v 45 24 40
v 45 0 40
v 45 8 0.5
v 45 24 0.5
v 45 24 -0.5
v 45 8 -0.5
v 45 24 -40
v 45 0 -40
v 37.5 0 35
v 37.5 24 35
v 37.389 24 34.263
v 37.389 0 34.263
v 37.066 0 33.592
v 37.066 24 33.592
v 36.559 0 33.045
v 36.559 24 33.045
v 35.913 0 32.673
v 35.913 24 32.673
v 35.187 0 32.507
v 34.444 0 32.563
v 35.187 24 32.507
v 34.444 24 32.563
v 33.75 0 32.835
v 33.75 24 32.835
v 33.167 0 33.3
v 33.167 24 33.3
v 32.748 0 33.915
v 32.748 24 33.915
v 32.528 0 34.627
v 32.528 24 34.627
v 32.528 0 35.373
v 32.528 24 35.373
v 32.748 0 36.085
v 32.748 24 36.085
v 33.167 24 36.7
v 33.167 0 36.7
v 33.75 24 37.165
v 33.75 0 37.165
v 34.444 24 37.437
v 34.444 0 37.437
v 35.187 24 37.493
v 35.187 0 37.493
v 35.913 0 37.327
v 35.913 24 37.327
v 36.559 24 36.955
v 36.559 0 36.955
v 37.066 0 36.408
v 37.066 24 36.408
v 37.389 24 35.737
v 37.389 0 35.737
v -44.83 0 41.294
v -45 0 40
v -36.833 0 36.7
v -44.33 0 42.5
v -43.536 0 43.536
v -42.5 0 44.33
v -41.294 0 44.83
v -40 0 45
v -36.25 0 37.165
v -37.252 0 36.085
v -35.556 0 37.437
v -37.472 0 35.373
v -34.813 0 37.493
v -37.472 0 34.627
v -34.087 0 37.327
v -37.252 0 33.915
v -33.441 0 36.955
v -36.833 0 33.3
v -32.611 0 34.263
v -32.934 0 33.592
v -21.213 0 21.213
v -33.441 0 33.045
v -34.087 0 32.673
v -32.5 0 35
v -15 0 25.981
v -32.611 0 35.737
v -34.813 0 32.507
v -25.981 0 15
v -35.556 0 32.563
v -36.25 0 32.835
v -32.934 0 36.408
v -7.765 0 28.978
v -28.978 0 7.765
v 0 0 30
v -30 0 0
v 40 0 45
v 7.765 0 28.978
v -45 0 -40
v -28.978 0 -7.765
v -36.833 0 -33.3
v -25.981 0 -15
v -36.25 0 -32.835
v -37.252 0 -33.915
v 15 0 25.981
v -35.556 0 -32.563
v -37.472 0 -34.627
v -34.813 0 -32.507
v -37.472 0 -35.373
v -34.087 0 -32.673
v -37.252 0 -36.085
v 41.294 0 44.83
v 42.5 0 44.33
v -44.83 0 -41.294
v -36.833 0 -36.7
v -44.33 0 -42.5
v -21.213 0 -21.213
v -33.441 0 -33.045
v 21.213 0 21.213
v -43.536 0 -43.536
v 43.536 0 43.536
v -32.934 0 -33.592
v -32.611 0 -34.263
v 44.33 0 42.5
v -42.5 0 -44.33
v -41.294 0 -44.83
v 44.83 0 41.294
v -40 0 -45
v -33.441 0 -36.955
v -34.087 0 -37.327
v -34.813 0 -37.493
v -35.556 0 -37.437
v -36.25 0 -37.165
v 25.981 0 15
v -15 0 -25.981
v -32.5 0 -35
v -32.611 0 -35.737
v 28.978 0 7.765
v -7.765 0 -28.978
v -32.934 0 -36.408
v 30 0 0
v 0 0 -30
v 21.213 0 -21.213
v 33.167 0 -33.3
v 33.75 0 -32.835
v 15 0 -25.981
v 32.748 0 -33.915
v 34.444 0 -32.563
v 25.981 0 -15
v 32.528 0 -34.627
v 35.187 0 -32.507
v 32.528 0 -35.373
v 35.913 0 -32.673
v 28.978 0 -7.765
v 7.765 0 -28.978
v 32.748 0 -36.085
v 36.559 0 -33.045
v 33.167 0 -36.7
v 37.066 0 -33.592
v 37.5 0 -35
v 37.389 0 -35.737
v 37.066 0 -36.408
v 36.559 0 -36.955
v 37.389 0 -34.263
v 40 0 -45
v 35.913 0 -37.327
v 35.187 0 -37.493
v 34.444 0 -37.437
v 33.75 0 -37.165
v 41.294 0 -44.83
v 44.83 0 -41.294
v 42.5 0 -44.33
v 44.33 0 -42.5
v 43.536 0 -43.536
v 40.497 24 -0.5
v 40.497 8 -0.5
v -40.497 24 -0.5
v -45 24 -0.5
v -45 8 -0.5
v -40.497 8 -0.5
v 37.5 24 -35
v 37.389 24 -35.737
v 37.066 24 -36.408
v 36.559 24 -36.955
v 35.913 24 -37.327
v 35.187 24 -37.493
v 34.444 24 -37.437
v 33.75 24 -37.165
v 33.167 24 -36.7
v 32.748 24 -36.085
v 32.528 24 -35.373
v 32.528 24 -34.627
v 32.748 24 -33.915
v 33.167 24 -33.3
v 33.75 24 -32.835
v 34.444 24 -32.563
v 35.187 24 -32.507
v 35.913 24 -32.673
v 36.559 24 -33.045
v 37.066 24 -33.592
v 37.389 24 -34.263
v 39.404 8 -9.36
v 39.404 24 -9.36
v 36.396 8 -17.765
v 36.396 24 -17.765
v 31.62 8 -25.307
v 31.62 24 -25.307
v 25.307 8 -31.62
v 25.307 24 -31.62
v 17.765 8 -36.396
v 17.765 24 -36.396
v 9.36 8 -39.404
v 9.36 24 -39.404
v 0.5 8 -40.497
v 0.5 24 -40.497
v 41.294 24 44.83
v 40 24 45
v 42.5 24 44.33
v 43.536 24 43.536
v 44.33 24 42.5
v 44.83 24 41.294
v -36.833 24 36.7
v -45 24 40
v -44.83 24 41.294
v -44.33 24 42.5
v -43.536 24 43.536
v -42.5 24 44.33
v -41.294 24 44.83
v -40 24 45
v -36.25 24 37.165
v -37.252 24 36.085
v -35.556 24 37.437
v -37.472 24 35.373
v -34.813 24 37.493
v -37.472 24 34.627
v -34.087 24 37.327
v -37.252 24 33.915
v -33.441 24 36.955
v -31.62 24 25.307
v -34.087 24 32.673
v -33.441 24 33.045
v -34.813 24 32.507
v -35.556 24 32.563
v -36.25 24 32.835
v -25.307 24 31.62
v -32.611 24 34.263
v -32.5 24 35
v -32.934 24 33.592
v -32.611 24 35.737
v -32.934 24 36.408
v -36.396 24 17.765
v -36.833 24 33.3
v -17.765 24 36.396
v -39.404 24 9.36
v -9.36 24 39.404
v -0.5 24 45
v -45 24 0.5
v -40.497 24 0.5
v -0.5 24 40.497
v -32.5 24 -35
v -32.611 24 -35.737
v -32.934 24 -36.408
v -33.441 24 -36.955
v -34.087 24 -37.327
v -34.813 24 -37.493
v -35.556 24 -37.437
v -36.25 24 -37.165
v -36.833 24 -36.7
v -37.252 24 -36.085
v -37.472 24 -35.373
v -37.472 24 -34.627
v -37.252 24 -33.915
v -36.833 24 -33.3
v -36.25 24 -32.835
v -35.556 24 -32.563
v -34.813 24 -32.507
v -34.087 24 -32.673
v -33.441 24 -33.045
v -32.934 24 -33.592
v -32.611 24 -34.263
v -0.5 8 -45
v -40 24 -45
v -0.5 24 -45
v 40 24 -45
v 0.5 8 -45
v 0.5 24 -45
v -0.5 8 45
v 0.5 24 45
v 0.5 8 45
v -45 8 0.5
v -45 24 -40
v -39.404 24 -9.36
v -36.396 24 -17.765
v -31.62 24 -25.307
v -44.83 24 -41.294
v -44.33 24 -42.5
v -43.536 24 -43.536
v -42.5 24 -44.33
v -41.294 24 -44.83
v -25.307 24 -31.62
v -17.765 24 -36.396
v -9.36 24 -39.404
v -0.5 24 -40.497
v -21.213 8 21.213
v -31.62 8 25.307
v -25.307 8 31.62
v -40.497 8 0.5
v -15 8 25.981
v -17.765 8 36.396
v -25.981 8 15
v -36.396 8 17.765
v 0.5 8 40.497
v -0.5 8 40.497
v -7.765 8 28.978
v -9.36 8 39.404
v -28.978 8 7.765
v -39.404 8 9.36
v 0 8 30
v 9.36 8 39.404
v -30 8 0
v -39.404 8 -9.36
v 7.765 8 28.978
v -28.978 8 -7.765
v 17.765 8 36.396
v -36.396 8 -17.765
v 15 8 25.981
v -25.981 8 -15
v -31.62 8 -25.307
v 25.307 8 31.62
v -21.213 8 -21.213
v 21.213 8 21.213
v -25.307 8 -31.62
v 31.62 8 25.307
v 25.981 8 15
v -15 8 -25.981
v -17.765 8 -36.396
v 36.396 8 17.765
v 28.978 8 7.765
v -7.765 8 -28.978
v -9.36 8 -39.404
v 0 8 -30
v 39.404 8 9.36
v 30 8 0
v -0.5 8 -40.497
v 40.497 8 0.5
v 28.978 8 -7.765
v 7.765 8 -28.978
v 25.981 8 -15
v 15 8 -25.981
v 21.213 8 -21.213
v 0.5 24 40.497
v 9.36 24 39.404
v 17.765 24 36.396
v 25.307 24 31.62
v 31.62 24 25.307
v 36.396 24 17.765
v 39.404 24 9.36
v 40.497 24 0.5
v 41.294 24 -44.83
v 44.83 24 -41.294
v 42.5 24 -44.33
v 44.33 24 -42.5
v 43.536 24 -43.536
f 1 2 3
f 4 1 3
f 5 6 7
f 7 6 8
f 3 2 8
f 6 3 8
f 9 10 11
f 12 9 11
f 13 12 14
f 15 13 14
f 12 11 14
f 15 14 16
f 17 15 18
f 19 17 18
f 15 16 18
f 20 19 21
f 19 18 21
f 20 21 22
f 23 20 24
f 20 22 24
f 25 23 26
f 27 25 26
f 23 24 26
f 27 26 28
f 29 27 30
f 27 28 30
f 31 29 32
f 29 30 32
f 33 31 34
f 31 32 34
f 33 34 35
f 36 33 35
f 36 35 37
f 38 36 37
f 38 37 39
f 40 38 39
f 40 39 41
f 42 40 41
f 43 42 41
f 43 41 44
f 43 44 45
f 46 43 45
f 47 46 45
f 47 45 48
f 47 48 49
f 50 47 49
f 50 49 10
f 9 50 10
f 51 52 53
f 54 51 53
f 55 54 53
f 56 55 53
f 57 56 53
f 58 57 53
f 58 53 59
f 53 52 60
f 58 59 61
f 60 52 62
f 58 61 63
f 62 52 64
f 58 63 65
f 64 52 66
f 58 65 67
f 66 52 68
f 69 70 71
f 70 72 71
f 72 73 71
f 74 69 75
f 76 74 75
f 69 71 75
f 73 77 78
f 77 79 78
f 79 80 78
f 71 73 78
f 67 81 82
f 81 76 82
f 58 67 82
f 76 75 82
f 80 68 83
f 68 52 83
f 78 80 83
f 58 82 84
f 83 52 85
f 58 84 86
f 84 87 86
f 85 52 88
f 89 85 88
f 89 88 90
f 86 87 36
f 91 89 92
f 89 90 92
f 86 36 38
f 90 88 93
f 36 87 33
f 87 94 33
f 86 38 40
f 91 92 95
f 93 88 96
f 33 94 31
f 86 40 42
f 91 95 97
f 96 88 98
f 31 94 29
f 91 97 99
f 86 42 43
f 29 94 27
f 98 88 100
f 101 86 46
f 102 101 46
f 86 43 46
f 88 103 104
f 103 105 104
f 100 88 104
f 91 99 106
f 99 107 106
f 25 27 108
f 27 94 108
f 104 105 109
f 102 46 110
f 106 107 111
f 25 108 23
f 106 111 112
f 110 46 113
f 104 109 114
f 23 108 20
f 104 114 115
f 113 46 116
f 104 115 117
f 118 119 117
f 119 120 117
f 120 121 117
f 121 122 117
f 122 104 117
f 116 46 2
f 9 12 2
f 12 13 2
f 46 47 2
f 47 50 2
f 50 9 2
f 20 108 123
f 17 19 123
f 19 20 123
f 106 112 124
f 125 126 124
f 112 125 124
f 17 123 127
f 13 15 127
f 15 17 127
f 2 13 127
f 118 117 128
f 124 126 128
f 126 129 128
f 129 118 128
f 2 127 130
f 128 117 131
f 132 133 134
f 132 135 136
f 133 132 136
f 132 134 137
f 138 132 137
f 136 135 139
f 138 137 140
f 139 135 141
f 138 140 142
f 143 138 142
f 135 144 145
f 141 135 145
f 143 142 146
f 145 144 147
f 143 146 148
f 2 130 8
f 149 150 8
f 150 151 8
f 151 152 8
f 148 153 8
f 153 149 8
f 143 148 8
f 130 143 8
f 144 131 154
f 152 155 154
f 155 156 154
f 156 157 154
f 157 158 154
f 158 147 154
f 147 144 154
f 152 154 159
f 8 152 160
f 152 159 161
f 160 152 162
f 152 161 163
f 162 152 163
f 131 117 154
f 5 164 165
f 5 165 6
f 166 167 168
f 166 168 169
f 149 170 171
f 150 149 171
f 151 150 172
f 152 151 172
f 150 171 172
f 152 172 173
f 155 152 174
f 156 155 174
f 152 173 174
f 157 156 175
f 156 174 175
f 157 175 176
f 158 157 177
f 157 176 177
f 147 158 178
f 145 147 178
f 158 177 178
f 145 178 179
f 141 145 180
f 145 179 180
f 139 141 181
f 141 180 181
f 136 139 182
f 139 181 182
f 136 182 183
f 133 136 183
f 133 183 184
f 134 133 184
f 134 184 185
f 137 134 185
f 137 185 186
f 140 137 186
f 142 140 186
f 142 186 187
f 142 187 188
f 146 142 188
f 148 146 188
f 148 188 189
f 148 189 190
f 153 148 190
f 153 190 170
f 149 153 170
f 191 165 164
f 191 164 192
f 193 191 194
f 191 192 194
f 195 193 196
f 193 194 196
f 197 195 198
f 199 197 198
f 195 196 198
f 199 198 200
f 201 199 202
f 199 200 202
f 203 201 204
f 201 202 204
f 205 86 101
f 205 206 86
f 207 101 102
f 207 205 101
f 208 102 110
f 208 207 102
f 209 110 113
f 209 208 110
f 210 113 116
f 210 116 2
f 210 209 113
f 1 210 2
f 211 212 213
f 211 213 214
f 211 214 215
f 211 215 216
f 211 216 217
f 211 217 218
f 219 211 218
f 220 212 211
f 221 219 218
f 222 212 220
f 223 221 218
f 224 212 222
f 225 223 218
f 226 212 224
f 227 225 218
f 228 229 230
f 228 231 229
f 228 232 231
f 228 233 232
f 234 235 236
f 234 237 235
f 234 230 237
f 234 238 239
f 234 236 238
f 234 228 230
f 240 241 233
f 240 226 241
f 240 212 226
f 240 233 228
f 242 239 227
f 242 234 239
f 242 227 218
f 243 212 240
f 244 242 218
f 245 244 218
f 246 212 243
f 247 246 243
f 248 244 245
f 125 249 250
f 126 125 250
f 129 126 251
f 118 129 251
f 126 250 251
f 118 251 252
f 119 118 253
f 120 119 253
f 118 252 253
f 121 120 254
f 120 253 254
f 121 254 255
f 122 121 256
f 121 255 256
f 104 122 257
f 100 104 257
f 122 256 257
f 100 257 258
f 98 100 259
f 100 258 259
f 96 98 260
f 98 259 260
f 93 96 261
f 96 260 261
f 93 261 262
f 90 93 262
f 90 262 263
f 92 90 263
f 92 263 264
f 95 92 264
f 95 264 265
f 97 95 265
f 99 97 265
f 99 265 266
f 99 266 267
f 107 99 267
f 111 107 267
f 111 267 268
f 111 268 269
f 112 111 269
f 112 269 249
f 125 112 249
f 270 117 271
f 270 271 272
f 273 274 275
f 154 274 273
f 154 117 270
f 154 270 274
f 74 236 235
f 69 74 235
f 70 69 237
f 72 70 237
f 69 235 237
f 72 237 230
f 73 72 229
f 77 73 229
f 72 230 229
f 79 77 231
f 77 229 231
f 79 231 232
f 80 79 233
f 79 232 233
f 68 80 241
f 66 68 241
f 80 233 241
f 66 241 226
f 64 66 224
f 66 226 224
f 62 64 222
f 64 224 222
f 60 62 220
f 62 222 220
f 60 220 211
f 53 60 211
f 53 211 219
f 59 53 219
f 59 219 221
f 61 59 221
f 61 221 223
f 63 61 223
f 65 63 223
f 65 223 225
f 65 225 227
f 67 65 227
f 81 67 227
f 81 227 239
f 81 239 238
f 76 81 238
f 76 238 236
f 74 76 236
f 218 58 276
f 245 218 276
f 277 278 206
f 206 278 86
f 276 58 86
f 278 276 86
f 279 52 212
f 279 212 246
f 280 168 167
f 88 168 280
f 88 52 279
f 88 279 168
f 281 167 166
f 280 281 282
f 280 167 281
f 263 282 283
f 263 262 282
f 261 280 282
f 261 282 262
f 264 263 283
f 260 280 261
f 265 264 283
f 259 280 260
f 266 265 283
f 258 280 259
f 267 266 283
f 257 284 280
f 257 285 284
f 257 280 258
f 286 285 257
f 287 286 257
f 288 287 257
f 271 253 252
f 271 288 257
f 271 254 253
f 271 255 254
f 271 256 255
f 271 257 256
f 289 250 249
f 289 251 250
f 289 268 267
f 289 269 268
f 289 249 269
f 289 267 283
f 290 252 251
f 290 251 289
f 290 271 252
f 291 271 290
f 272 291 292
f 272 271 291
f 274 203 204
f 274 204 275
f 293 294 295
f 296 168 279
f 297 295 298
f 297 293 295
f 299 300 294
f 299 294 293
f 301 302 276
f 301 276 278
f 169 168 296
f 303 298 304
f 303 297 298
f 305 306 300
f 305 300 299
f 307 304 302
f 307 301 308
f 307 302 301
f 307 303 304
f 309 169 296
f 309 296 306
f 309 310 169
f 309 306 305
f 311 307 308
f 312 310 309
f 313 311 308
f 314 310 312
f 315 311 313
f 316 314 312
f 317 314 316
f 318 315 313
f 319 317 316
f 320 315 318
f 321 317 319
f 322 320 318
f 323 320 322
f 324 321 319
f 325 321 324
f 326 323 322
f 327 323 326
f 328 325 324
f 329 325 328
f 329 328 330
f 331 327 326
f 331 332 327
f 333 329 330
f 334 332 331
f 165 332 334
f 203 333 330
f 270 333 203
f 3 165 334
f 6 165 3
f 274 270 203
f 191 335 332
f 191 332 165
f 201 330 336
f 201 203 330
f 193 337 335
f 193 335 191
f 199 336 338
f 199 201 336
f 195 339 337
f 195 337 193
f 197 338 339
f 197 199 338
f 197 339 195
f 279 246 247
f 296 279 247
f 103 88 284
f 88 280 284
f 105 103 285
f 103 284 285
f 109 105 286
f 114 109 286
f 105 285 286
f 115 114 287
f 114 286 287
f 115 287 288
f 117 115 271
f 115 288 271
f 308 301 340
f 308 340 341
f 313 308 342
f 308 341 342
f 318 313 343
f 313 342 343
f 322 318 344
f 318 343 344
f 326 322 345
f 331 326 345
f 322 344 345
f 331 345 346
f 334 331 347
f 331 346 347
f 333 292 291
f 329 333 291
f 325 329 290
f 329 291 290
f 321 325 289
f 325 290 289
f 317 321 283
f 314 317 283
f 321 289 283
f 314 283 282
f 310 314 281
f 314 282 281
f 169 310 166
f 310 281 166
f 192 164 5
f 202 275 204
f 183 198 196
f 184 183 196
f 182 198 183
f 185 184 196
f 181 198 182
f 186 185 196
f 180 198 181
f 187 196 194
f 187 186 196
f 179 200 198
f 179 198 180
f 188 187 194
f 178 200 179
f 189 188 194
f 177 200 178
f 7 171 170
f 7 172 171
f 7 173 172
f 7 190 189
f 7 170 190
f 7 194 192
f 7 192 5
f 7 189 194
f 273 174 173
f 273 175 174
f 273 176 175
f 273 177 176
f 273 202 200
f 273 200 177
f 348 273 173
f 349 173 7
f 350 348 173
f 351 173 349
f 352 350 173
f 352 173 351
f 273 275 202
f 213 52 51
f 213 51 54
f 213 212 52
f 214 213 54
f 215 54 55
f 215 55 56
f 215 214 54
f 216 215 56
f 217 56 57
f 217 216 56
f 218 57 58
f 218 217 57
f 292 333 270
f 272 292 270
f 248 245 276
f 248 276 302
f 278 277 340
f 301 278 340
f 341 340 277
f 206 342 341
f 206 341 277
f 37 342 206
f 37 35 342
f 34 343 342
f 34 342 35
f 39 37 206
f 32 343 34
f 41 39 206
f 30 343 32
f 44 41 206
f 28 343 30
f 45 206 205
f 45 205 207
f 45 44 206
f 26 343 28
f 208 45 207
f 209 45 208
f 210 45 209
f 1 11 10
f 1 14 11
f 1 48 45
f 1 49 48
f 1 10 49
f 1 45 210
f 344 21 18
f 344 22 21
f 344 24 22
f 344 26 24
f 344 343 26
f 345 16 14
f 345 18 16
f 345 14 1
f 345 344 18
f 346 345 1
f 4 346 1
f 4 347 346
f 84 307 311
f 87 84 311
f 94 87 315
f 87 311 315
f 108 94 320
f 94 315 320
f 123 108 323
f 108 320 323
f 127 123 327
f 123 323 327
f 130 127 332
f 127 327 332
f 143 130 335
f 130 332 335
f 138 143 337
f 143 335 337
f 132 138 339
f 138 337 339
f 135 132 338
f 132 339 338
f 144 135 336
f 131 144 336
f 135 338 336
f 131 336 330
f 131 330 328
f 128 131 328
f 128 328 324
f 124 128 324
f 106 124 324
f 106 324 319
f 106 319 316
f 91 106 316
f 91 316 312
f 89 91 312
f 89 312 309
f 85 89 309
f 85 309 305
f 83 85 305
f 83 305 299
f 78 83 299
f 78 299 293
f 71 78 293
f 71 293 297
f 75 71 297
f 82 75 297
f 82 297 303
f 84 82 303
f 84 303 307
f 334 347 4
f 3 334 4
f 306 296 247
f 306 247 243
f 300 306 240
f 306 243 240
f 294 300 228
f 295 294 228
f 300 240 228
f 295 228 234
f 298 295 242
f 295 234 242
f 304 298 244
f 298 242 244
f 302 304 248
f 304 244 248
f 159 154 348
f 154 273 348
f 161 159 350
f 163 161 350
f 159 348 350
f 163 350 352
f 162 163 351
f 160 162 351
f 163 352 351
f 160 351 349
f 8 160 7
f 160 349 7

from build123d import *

# Parameters (mm, degrees)
SKETCH1_W             = 90
SKETCH1_H             = 90
SKETCH1_R             = 34
BOSS_EXTRUDE1_DEPTH   = 24
SKETCH2_R             = 40.5
CUT_EXTRUDE1_DEPTH    = 16
SKETCH3_R             = 12.7
CUT_EXTRUDE2_DEPTH    = 19
M6X1_0_TAPPED_HOLE1_D = 5
FILLET1_R             = 5
SKETCH7_R             = 30
SKETCH7_R_2           = 20
SKETCH7_R_3           = 12.7
CUT_EXTRUDE3_DEPTH    = 66.620118866
SKETCH8_W             = 13.825432395
SKETCH8_H             = 1
SKETCH8_W_2           = 1
SKETCH8_H_2           = 13.825432395
CUT_EXTRUDE4_DEPTH    = 16


with BuildPart() as part:
    # Sketch1 → Boss-Extrude1 (new body)
    # profile 1 of 2: a face of its own
    with BuildSketch(Plane(origin=(0, 0, 0), x_dir=(1, 0, 0), z_dir=(0, 1, 0))):
        Rectangle(SKETCH1_W, SKETCH1_H)
        Circle(SKETCH1_R, mode=Mode.SUBTRACT)
    # profile 2 of 2: a face of its own
    with BuildSketch(Plane(origin=(0, 0, 0), x_dir=(1, 0, 0), z_dir=(0, 1, 0))):
        Circle(SKETCH1_R)
    extrude(amount=BOSS_EXTRUDE1_DEPTH)

    # Sketch2 → Cut-Extrude1 (cut)
    with BuildSketch(Plane(origin=(0, 24, 0), x_dir=(1, 0, 0), z_dir=(0, 1, 0))):
        with Locations(Location((0, 0, 0), (0, 0, 270))):
            Circle(SKETCH2_R)
    extrude(amount=-CUT_EXTRUDE1_DEPTH, mode=Mode.SUBTRACT)

    # Sketch3 → Cut-Extrude2 (cut)
    with BuildSketch(Plane(origin=(0, 8, 0), x_dir=(1, 0, 0), z_dir=(0, 1, 0))):
        with Locations(Location((0, 0, 0), (0, 0, 270))):
            Circle(SKETCH3_R)
    extrude(amount=-CUT_EXTRUDE2_DEPTH, mode=Mode.SUBTRACT)

    # M6x1.0 Tapped Hole1 (through all)
    with Locations(Plane(origin=(0, 0, 0), x_dir=(-1, 0, 0), z_dir=(0, -1, 0))):
        with Locations((35, 35), (35, -35), (-35, -35), (-35, 35)):
            Hole(M6X1_0_TAPPED_HOLE1_D / 2)

    # Fillet1
    fillet1_edges = [part.edges().sort_by_distance(p)[0] for p in [
        (-45, 12, 45),
        (-45, 12, -45),
        (45, 12, -45),
        (45, 12, 45),
    ]]
    fillet(fillet1_edges, radius=FILLET1_R)

    # Sketch7 → Cut-Extrude3 (cut, through all)
    # profile 1 of 2: a face of its own
    with BuildSketch(Plane(origin=(0, 8, 0), x_dir=(1, 0, 0), z_dir=(0, 1, 0))):
        with Locations(Location((0, 0, 0), (0, 0, 270))):
            Circle(SKETCH7_R)
        Circle(SKETCH7_R_2, mode=Mode.SUBTRACT)
    # profile 2 of 2: a face of its own
    with BuildSketch(Plane(origin=(0, 8, 0), x_dir=(1, 0, 0), z_dir=(0, 1, 0))):
        Circle(SKETCH7_R_2)
        Circle(SKETCH7_R_3, mode=Mode.SUBTRACT)
    extrude(amount=-CUT_EXTRUDE3_DEPTH, mode=Mode.SUBTRACT)

    # Sketch8 → Cut-Extrude4 (cut)
    with BuildSketch(Plane(origin=(0, 24, 0), x_dir=(1, 0, 0), z_dir=(0, 1, 0))):
        with Locations((42.446502967, 0)):
            Rectangle(SKETCH8_W, SKETCH8_H)
        with Locations((0, 42.446502967)):
            Rectangle(SKETCH8_W_2, SKETCH8_H_2)
        with Locations((0, -42.446502967)):
            Rectangle(SKETCH8_W_2, SKETCH8_H_2)
        with Locations((-42.446502967, 0)):
            Rectangle(SKETCH8_W, SKETCH8_H)
    extrude(amount=-CUT_EXTRUDE4_DEPTH, mode=Mode.SUBTRACT)


solid = part.part
